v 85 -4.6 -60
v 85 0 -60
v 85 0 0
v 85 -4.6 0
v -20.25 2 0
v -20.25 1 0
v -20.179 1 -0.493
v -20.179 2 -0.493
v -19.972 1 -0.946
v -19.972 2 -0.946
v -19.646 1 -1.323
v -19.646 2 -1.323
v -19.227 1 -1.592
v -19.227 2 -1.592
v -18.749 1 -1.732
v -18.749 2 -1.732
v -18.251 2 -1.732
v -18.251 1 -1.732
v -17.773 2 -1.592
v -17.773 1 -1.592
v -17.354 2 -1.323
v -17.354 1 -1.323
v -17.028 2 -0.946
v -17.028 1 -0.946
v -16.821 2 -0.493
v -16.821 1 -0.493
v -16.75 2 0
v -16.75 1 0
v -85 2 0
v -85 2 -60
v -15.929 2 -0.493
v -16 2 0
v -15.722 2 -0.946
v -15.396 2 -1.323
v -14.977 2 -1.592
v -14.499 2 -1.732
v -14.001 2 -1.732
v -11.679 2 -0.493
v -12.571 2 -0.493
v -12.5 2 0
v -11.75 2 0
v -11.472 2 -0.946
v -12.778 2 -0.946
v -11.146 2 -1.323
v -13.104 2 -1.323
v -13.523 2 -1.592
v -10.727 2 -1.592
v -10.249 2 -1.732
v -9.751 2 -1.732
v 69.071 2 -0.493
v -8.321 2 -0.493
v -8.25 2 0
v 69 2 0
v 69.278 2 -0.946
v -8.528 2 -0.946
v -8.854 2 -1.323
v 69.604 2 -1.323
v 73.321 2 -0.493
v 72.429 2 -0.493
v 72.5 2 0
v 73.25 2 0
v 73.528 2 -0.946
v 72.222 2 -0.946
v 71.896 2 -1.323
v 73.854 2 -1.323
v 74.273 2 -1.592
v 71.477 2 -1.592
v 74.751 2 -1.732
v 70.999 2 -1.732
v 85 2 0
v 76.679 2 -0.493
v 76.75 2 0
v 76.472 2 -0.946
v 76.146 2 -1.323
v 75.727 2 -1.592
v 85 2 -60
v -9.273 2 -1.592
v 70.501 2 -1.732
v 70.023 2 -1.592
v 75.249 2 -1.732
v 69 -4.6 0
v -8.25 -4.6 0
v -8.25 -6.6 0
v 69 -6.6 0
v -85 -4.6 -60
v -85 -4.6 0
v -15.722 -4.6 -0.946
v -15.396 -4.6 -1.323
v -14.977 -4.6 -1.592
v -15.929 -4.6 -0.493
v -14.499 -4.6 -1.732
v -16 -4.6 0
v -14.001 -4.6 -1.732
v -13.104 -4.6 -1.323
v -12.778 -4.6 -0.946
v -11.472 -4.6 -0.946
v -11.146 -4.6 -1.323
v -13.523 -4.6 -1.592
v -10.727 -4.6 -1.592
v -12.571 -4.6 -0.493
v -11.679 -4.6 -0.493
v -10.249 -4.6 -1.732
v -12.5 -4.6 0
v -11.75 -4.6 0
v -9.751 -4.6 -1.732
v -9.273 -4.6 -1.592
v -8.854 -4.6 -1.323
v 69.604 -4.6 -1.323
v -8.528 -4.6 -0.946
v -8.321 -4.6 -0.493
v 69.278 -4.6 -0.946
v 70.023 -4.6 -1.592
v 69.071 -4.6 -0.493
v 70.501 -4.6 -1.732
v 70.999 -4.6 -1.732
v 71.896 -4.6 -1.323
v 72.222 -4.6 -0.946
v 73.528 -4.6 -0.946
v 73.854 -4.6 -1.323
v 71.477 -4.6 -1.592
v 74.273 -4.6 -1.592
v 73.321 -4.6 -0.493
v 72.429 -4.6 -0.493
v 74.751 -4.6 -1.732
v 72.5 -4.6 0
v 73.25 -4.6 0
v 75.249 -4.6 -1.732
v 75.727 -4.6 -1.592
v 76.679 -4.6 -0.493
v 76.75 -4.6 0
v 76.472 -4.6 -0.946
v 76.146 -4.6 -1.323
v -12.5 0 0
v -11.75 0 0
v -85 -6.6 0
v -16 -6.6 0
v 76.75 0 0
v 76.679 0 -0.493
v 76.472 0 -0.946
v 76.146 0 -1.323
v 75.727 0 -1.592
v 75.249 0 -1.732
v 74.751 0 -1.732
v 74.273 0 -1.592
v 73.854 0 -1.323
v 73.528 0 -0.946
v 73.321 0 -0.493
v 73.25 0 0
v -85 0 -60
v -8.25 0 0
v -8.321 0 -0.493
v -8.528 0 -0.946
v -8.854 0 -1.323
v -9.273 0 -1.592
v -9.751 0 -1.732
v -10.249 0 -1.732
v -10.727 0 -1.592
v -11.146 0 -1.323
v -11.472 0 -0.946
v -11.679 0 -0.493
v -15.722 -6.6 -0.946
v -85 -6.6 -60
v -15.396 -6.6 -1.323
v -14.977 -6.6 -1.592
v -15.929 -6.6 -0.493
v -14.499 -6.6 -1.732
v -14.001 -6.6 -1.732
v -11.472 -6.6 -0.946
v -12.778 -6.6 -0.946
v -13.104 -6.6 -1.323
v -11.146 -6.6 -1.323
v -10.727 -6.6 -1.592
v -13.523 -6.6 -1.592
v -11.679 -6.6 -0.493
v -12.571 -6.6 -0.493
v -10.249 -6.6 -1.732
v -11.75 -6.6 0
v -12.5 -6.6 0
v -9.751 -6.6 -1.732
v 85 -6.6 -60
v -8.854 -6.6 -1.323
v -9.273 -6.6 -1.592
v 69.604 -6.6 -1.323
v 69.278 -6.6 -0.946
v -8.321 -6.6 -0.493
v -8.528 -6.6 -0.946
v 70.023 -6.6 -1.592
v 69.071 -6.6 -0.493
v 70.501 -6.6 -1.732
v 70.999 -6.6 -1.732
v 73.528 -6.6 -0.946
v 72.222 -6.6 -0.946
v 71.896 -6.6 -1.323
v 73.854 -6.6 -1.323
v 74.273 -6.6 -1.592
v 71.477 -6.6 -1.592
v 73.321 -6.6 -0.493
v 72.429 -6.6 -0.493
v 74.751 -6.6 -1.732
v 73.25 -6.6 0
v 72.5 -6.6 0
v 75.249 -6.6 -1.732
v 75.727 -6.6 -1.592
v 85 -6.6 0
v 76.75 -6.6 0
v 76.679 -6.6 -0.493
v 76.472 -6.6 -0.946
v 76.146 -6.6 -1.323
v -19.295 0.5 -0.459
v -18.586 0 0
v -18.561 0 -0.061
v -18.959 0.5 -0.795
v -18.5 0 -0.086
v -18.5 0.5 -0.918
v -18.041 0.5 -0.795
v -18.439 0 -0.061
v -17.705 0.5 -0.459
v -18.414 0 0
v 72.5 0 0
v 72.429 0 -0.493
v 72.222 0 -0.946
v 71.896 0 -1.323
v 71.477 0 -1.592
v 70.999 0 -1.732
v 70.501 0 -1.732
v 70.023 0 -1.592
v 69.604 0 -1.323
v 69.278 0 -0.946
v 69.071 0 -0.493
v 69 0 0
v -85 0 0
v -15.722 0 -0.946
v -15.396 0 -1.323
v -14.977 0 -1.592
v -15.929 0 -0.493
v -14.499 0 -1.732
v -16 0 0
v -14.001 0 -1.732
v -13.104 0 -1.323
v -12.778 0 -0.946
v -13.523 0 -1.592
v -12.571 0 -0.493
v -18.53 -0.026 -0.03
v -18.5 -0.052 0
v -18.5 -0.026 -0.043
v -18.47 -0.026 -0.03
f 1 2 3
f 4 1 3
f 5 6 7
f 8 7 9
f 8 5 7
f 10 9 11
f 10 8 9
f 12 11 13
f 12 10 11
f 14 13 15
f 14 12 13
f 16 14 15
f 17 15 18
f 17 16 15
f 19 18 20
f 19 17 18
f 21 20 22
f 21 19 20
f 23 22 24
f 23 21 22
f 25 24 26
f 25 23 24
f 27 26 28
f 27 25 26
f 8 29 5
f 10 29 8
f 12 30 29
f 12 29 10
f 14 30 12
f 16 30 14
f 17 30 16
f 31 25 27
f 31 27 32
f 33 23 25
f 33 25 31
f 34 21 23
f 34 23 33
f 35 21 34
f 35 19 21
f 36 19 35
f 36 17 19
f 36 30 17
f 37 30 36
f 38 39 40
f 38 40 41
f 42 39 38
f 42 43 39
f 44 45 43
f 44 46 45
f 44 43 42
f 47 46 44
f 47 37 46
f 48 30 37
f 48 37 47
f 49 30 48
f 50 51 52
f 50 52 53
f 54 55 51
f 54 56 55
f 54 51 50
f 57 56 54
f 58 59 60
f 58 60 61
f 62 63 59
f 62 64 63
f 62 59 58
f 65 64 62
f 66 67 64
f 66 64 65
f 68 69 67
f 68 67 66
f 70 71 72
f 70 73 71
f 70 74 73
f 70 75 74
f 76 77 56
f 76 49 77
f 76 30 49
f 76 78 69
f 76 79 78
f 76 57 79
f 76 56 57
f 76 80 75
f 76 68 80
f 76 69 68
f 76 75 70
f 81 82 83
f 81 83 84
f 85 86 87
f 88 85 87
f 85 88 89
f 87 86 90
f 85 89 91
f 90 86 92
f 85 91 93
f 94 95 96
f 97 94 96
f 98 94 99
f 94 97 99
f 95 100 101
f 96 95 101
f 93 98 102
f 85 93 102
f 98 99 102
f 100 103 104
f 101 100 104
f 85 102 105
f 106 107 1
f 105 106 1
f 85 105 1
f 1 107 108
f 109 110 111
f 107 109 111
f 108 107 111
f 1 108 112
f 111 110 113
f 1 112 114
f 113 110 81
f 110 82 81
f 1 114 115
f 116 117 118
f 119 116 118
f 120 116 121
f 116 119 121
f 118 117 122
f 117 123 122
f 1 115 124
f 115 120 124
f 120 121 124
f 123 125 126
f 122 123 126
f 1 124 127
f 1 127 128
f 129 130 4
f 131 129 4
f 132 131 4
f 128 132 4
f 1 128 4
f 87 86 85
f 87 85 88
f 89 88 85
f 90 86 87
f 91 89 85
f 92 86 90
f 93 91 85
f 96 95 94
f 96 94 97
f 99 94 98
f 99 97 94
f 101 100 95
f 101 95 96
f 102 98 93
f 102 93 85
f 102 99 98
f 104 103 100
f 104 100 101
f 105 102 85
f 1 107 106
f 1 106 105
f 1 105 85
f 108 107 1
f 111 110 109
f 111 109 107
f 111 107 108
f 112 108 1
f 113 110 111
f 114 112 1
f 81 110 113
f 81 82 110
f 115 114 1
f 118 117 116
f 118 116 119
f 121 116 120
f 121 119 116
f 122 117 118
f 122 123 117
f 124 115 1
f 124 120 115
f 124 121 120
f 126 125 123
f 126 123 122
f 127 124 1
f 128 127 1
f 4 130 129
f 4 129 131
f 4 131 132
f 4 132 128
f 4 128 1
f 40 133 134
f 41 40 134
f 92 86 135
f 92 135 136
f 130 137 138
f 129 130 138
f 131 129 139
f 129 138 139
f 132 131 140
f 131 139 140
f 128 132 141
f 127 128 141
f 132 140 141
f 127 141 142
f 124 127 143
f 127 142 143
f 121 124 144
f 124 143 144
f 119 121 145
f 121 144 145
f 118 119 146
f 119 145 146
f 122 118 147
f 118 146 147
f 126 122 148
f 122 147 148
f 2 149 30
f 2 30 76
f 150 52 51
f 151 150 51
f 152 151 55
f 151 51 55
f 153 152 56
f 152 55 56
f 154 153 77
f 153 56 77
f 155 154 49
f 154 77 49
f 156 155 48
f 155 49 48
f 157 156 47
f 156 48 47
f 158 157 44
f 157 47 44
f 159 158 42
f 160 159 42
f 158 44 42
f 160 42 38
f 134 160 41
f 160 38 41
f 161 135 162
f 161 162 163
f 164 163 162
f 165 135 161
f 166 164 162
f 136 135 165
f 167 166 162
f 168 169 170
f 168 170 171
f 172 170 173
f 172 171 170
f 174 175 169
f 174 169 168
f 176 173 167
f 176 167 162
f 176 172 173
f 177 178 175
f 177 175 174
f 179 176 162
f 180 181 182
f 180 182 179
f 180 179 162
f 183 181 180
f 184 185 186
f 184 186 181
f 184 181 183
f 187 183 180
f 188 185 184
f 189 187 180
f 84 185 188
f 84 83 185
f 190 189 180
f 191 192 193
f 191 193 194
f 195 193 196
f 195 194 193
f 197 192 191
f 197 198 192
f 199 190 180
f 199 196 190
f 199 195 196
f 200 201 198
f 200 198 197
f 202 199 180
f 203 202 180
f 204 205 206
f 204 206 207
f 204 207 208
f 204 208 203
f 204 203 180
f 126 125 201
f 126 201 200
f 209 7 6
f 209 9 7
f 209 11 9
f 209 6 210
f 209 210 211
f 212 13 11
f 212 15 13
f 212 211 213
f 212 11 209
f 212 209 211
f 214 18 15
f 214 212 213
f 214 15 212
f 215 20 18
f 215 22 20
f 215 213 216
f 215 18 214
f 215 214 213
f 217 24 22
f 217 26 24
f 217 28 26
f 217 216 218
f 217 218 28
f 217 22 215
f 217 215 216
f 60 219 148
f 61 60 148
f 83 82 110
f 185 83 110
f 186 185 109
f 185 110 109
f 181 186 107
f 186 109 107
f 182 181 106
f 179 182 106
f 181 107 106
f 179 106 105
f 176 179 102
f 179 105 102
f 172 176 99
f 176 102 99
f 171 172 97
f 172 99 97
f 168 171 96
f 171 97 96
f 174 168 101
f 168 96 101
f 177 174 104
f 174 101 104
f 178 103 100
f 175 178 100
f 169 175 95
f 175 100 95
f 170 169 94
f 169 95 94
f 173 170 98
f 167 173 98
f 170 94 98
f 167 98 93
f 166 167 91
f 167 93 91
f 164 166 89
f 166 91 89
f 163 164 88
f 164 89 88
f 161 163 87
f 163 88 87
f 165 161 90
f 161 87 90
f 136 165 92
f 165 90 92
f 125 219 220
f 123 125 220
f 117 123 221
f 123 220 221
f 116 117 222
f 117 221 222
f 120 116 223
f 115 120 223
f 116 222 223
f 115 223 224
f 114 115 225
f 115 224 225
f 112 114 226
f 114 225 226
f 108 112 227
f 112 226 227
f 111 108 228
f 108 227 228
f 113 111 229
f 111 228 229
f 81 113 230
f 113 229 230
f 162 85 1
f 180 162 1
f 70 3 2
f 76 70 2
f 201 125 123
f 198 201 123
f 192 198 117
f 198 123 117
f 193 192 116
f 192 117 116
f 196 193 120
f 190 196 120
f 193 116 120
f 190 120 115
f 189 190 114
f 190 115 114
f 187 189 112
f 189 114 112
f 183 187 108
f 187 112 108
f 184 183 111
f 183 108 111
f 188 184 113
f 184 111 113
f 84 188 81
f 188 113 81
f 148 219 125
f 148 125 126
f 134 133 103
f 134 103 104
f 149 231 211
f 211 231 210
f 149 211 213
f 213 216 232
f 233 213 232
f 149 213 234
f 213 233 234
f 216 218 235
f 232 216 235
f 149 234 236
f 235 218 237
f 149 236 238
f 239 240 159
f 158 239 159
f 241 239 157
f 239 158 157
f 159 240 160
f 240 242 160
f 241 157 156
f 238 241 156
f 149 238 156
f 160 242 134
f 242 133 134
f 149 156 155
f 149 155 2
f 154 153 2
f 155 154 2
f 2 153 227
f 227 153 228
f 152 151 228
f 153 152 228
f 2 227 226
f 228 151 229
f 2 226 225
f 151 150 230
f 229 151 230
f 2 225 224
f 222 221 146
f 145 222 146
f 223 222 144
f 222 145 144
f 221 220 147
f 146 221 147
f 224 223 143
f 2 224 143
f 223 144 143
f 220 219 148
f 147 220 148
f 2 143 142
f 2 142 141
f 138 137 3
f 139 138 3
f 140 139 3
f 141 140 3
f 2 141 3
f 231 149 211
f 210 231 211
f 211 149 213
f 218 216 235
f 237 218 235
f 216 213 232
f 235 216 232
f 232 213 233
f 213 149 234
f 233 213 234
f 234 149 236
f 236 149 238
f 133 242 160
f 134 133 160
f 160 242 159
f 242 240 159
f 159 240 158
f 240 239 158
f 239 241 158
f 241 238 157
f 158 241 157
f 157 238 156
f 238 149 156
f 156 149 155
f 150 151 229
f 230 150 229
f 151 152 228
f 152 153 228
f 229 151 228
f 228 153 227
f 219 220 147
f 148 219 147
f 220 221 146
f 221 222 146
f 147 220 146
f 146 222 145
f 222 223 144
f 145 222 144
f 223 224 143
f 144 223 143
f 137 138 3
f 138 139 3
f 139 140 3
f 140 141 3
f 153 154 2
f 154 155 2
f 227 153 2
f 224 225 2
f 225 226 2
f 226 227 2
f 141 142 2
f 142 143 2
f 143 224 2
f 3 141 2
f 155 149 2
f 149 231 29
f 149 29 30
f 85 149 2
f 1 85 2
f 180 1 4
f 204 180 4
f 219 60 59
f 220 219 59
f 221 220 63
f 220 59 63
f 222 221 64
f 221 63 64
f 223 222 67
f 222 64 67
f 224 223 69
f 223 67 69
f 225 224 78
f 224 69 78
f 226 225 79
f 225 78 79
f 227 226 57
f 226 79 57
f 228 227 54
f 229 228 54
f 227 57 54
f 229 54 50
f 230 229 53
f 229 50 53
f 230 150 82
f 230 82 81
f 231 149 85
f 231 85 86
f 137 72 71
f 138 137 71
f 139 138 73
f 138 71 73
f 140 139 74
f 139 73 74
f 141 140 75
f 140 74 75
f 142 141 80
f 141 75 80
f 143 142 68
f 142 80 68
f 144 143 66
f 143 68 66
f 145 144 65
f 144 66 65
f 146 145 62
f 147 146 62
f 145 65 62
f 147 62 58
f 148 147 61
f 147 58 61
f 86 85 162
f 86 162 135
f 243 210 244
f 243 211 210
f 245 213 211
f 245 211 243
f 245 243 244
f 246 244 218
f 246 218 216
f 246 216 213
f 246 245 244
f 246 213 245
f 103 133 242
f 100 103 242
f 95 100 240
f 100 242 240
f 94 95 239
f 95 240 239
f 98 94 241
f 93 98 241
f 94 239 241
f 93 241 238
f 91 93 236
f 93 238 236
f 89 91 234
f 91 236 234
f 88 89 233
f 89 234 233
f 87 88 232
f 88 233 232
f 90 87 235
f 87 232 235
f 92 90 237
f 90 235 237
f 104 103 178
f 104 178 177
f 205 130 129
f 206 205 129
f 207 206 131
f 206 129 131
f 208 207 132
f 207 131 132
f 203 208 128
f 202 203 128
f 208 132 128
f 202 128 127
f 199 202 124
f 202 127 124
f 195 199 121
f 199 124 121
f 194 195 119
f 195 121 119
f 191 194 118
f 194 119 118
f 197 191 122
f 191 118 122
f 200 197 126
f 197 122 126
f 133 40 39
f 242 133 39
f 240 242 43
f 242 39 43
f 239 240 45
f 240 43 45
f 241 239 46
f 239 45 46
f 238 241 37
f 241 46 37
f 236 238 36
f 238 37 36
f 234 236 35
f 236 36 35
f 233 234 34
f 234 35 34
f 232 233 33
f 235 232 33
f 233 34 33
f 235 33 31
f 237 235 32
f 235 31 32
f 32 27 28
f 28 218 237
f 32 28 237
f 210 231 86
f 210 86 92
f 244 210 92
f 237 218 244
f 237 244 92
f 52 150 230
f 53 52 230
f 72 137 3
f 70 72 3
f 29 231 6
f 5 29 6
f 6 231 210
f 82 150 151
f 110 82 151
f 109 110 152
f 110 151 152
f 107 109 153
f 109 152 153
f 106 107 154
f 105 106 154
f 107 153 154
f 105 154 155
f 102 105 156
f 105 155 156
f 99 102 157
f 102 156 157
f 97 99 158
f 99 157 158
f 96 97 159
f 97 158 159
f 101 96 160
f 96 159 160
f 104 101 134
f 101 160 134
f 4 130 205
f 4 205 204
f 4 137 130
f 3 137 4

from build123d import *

# Parameters (mm, degrees)
SKETCH1_W           = 170
SKETCH1_H           = 60
BOSS_EXTRUDE1_DEPTH = 2
SKETCH2_W           = 170
SKETCH2_H           = 60
BOSS_EXTRUDE2_DEPTH = 4.6
SKETCH3_W           = 170
SKETCH3_H           = 60
BOSS_EXTRUDE3_DEPTH = 2
SKETCH4_R           = 1.75
CUT_EXTRUDE1_DEPTH  = 105.398084274


with BuildPart() as part:
    # Sketch1 → Boss-Extrude1 (new body)
    with BuildSketch(Plane(origin=(0, 0, 0), x_dir=(1, 0, 0), z_dir=(0, 1, 0))):
        with Locations((0, 30)):
            Rectangle(SKETCH1_W, SKETCH1_H)
    extrude(amount=BOSS_EXTRUDE1_DEPTH)


with BuildPart() as body_2:
    # Sketch2 → Boss-Extrude2 (new body)
    with BuildSketch(Plane.XZ):
        with Locations((0, -30)):
            Rectangle(SKETCH2_W, SKETCH2_H)
    extrude(amount=BOSS_EXTRUDE2_DEPTH)


with BuildPart() as body_3:
    # Sketch3 → Boss-Extrude3 (new body)
    with BuildSketch(Plane.XZ.offset(4.6)):
        with Locations((0, -30)):
            Rectangle(SKETCH3_W, SKETCH3_H)
    extrude(amount=BOSS_EXTRUDE3_DEPTH)


with BuildPart() as cut_extrude1_tool:
    # Sketch4 → Cut-Extrude1 (new, through all)
    with BuildSketch(Plane(origin=(0, 2, 0), x_dir=(1, 0, 0), z_dir=(0, 1, 0))):
        with Locations((75, 0)):
            Circle(SKETCH4_R)
        with Locations((-10, 0)):
            Circle(SKETCH4_R)
        with Locations((70.75, 0)):
            Circle(SKETCH4_R)
        with Locations((-14.25, 0)):
            Circle(SKETCH4_R)
    extrude(amount=-CUT_EXTRUDE1_DEPTH)


with BuildPart() as part_1:
    add(part.part)

    # Cut-Extrude1: cut by cut_extrude1_tool
    add(cut_extrude1_tool.part, mode=Mode.SUBTRACT)


with BuildPart() as body_2_1:
    add(body_2.part)

    # Cut-Extrude1: cut by cut_extrude1_tool
    add(cut_extrude1_tool.part, mode=Mode.SUBTRACT)


with BuildPart() as body_3_1:
    add(body_3.part)

    # Cut-Extrude1: cut by cut_extrude1_tool
    add(cut_extrude1_tool.part, mode=Mode.SUBTRACT)


with BuildPart() as f_3_5_3_5_diameter_hole1_tool:
    # Sketch8 → Ø3.5 (3.5) Diameter Hole1 (revolve)
    with BuildSketch(Plane(origin=(-18.5, 2, 0), x_dir=(0, 0, 1), z_dir=(1, 0, 0))):
        Polygon((0, 0), (0, 2.051506083), (1.75, 1), (1.75, 0), align=None)
    revolve(axis=Axis((-18.5, 8.35, 0), (0, -1, 0)))


with BuildPart() as part_2:
    add(part_1.part)

    # Ø3.5 (3.5) Diameter Hole1: cut by f_3_5_3_5_diameter_hole1_tool
    add(f_3_5_3_5_diameter_hole1_tool.part, mode=Mode.SUBTRACT)


with BuildPart() as body_2_2:
    add(body_2_1.part)

    # Ø3.5 (3.5) Diameter Hole1: cut by f_3_5_3_5_diameter_hole1_tool
    add(f_3_5_3_5_diameter_hole1_tool.part, mode=Mode.SUBTRACT)


solid = Compound([body_3_1.part, part_2.part, body_2_2.part])
